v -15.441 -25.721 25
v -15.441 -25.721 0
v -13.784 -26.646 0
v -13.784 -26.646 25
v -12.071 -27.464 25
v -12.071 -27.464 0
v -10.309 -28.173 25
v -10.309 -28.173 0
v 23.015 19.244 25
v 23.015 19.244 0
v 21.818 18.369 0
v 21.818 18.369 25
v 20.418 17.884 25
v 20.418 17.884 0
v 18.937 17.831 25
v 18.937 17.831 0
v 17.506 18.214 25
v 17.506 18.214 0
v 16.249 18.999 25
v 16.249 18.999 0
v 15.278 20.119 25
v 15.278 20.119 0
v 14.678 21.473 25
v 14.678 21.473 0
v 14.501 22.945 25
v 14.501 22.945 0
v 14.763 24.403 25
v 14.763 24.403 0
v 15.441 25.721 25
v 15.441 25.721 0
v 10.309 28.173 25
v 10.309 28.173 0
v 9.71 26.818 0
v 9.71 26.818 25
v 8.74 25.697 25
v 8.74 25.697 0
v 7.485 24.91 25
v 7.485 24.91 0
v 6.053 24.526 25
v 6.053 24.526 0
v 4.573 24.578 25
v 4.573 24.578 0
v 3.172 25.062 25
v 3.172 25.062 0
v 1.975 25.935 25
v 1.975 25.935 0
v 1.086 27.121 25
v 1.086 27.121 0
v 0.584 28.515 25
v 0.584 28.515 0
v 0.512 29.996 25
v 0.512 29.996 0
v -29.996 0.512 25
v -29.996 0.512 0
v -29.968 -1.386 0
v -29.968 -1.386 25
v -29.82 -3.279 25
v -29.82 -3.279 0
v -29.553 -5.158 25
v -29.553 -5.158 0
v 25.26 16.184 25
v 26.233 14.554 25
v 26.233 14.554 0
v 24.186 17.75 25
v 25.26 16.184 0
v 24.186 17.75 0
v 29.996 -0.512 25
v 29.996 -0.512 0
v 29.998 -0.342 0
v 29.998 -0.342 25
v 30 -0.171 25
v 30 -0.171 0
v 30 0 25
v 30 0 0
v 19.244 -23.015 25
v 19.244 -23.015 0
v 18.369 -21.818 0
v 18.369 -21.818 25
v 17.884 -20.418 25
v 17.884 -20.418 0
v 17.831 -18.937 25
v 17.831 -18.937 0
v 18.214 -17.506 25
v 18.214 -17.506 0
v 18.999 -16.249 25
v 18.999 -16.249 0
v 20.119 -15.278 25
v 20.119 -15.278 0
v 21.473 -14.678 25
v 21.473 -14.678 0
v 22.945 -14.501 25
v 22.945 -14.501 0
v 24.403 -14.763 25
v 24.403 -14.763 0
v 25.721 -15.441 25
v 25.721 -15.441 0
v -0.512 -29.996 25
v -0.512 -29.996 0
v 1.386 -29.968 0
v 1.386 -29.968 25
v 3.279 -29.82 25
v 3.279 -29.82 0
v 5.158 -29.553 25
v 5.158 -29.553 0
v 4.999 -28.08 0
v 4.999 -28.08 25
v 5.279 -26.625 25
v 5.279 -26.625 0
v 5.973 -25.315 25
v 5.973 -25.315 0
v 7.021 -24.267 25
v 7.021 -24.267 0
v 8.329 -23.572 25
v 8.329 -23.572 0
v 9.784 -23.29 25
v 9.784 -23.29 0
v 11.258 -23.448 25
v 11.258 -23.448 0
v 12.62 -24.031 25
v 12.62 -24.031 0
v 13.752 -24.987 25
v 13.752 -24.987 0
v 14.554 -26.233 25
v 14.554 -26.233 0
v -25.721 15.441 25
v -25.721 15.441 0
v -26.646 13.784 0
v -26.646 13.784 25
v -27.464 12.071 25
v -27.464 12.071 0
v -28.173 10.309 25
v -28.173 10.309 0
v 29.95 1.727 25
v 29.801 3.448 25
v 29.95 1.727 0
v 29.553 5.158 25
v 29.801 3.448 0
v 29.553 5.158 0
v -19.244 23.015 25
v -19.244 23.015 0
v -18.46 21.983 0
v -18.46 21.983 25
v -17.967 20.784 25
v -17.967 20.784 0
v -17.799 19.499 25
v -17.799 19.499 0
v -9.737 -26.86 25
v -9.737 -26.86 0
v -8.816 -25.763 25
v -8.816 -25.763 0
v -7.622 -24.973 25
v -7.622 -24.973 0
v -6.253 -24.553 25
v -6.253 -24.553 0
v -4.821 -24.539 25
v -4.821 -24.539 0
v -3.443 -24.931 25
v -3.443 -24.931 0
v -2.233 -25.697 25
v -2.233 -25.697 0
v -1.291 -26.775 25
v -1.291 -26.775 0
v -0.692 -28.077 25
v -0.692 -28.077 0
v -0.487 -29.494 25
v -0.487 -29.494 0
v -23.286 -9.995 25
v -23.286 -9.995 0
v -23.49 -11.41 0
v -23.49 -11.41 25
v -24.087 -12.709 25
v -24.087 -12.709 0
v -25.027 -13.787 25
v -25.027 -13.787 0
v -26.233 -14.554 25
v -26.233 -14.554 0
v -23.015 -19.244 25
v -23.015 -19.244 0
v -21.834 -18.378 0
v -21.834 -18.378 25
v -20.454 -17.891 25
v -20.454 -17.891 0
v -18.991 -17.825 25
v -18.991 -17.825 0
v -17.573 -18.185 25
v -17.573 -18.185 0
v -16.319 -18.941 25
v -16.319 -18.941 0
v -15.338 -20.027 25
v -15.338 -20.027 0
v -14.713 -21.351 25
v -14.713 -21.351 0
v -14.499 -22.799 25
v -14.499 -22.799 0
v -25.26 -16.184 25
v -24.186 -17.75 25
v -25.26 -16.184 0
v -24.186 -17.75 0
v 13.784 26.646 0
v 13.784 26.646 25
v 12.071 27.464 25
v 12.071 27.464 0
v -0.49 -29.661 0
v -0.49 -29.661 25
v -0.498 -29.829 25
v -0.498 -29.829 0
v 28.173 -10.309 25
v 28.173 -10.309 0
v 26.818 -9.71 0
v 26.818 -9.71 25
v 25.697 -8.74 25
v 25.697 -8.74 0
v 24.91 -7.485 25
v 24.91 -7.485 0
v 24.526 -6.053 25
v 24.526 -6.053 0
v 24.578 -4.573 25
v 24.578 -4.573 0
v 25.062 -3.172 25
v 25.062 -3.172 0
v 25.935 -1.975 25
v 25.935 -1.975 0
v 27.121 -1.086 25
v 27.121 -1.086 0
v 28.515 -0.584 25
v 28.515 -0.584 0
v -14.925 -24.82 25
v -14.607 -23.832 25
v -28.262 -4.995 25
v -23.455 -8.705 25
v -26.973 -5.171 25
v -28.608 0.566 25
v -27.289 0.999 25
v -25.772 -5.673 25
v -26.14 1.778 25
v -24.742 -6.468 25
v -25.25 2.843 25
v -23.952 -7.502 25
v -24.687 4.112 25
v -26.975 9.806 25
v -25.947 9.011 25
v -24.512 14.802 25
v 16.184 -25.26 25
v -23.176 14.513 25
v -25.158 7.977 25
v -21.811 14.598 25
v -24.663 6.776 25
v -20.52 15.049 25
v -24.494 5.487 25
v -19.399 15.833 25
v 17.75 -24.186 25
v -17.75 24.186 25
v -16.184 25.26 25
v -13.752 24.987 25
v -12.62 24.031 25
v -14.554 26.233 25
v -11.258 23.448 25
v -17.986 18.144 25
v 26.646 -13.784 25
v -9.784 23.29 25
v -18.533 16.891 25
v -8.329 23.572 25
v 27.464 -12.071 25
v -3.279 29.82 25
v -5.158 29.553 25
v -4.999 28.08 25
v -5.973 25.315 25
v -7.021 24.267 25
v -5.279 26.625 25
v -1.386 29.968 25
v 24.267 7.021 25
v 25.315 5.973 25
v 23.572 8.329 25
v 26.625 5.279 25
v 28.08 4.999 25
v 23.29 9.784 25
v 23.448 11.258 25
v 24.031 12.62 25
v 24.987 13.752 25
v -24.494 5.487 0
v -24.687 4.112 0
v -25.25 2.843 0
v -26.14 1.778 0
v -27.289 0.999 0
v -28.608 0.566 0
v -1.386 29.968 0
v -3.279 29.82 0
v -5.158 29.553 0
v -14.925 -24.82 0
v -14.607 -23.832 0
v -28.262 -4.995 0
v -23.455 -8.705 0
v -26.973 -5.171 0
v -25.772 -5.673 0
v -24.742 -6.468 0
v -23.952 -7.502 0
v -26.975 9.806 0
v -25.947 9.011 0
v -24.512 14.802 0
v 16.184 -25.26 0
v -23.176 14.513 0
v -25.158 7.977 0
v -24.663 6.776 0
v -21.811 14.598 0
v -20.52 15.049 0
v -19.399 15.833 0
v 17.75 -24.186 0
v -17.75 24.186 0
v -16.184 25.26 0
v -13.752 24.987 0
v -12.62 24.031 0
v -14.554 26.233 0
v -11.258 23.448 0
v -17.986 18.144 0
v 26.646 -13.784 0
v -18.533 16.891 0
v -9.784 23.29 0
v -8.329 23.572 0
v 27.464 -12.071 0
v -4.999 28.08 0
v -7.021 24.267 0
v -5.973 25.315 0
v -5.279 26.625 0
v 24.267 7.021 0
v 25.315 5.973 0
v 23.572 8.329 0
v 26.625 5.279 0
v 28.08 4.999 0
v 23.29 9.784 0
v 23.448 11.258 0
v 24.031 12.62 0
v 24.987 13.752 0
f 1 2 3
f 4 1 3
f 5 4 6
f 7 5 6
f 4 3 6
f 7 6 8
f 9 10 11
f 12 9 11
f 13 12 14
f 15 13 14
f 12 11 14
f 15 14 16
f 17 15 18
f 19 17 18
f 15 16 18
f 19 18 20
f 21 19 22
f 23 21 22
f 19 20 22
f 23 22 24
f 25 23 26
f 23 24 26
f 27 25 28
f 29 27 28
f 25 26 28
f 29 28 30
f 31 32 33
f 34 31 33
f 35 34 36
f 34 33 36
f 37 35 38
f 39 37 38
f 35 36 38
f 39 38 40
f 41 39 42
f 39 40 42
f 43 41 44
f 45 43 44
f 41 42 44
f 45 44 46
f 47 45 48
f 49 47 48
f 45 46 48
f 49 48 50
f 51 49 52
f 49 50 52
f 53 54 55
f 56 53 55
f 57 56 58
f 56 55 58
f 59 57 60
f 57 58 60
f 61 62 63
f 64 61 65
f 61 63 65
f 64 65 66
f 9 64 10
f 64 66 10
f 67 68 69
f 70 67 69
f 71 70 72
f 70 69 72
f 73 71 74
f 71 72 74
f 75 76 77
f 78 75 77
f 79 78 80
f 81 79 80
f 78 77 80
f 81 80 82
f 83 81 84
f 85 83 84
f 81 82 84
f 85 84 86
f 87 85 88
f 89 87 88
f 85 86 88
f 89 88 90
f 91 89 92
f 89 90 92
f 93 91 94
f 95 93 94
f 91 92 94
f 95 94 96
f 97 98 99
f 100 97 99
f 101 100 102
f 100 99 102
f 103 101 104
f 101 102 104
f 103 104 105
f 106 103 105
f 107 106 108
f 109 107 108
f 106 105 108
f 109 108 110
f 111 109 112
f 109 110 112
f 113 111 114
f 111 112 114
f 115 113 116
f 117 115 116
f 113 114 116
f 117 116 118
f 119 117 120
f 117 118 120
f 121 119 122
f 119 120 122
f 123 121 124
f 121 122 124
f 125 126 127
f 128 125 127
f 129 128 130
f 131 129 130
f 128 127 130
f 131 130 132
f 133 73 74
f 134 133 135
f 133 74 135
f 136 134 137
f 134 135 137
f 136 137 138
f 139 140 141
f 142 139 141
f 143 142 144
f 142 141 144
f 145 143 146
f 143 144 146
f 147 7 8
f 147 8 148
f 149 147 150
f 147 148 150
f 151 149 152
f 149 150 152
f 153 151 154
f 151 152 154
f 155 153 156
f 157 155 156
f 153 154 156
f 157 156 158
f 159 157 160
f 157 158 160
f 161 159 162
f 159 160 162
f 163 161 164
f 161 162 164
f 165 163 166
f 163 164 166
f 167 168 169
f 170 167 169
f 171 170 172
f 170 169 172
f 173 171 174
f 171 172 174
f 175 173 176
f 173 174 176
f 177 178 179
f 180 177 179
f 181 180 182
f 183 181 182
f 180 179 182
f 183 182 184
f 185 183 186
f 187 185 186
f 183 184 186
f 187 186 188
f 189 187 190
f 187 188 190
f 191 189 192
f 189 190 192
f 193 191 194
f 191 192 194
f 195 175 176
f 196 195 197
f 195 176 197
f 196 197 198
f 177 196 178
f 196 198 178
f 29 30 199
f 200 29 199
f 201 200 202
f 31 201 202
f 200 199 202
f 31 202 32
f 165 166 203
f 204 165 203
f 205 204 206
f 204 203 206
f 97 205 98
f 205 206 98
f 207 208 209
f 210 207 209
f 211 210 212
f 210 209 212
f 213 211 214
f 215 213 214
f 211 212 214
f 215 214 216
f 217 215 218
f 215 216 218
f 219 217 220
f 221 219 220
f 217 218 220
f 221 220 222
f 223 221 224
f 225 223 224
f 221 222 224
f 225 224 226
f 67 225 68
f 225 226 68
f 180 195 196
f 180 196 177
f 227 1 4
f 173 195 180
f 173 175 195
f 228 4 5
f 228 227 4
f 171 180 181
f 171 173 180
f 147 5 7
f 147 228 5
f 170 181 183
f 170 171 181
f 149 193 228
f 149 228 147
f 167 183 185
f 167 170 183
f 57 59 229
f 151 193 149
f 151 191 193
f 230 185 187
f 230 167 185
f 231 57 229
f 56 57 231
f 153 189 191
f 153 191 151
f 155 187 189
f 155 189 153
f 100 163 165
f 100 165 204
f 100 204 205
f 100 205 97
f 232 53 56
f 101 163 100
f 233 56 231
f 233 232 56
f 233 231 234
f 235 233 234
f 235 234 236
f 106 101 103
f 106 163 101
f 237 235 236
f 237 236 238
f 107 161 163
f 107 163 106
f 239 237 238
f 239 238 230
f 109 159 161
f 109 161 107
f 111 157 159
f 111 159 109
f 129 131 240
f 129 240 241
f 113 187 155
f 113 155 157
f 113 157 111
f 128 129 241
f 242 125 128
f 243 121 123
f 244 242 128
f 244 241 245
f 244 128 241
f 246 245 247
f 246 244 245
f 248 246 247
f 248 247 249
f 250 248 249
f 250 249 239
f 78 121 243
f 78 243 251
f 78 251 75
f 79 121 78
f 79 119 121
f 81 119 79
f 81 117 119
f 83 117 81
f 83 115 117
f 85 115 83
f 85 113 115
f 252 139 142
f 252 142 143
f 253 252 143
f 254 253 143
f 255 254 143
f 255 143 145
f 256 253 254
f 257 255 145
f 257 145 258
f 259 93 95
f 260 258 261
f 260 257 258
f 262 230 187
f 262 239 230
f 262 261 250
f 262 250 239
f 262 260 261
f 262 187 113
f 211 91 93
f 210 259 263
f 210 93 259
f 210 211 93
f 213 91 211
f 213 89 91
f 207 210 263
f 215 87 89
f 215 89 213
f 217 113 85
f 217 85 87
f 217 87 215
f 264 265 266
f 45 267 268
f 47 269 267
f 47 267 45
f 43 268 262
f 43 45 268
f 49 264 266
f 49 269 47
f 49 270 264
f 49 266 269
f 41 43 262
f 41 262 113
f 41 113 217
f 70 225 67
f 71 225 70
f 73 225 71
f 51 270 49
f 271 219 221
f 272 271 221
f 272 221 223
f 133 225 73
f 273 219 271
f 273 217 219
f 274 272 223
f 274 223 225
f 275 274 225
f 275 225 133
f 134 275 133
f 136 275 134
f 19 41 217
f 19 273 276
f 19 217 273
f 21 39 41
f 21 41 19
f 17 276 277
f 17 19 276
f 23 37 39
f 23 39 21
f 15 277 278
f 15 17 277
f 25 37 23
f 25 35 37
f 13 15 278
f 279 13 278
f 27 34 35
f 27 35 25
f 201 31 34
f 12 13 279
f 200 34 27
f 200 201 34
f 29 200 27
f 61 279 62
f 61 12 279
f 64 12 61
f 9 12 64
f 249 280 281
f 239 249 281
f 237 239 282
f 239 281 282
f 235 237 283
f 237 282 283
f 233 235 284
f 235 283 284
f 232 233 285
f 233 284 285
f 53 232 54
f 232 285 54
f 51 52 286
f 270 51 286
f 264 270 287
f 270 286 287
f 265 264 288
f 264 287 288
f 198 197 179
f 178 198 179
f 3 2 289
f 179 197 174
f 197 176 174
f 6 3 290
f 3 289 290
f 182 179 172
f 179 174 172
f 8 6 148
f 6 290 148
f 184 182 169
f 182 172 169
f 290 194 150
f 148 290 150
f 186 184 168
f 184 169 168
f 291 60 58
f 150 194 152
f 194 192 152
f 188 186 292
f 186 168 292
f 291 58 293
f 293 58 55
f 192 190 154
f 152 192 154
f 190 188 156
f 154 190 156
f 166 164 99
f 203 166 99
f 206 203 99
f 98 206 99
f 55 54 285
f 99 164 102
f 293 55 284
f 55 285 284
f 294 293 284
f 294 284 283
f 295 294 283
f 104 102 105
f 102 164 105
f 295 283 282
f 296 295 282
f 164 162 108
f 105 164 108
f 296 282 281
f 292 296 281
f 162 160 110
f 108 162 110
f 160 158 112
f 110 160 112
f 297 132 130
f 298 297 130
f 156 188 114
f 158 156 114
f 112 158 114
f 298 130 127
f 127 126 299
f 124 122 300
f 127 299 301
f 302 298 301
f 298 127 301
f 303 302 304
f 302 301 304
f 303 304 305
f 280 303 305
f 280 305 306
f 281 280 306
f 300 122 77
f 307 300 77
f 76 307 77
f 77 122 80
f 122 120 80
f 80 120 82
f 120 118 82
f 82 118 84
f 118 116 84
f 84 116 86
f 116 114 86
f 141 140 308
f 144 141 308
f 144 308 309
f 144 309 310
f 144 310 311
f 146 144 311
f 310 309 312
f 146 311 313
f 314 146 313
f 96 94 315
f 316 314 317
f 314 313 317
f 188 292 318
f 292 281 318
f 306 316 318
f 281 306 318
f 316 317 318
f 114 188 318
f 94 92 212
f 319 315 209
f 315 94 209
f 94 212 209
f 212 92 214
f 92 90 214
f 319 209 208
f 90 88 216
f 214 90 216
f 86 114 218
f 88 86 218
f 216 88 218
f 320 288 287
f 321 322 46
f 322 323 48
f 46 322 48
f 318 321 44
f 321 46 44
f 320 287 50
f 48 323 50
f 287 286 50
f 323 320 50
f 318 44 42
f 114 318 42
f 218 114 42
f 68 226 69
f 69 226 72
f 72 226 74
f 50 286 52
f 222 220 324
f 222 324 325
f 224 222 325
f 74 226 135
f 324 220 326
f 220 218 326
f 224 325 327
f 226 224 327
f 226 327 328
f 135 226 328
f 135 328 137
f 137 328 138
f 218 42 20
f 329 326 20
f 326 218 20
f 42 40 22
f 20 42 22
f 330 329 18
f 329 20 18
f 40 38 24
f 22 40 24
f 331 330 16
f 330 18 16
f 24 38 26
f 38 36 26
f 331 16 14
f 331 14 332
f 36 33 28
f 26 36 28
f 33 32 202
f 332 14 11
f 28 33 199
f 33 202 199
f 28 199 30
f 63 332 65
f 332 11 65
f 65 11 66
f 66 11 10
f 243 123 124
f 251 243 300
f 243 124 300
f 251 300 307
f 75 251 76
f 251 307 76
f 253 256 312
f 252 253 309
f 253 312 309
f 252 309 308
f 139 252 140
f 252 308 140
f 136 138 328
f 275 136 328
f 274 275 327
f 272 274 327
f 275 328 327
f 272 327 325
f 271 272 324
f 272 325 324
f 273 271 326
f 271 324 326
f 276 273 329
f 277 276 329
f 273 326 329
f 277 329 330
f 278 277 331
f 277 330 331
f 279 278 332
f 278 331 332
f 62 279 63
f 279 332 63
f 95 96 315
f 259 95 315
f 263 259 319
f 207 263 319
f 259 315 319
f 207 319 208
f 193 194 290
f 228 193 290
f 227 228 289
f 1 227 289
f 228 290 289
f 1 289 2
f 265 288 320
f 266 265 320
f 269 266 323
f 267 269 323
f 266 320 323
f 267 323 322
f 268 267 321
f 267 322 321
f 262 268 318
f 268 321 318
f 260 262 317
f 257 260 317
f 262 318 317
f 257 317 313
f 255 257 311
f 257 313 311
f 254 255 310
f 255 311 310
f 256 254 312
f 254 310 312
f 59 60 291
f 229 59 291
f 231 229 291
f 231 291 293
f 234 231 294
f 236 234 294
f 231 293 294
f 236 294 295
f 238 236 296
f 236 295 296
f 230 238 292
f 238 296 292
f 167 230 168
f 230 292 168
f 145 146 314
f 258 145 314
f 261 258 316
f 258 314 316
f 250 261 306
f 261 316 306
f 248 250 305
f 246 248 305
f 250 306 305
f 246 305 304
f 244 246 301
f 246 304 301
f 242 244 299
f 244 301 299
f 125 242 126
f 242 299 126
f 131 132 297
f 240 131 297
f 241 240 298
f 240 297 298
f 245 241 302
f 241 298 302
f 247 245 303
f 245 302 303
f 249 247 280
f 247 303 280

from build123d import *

# Parameters (mm, degrees)
F1_DEPTH = 25


with BuildPart() as f1:
    # F0 (on Top) → F1 (new body)
    with BuildSketch(Plane.XY):
        with BuildLine():
            ThreePointArc((29.995626, -0.512264), (29.998907, -0.256141), (30, 0))
            ThreePointArc((30, 0), (29.888092, 2.588808), (29.553205, 5.158303))
            ThreePointArc((29.553205, 5.158303), (23.571681, 8.329218), (26.233106, 14.55418))
            ThreePointArc((26.233106, 14.55418), (24.735282, 16.975448), (23.014675, 19.243824))
            ThreePointArc((23.014675, 19.243824), (16.249065, 18.999155), (15.441446, 25.720842))
            ThreePointArc((15.441446, 25.720842), (12.933658, 27.06881), (10.309381, 28.172978))
            ThreePointArc((10.309381, 28.172978), (4.572526, 24.578283), (0.512264, 29.995626))
            ThreePointArc((0.512264, 29.995626), (-2.333528, 29.909106), (-5.158303, 29.553205))
            ThreePointArc((-5.158303, 29.553205), (-8.329218, 23.571681), (-14.55418, 26.233106))
            ThreePointArc((-14.55418, 26.233106), (-16.975448, 24.735282), (-19.243824, 23.014675))
            ThreePointArc((-19.243824, 23.014675), (-18.17428, 21.39943), (-17.798986, 19.498878))
            ThreePointArc((-17.798986, 19.498878), (-20.519653, 15.048638), (-25.720842, 15.441446))
            ThreePointArc((-25.720842, 15.441446), (-27.06881, 12.933658), (-28.172978, 10.309381))
            ThreePointArc((-28.172978, 10.309381), (-25.518716, 8.519785), (-24.49394, 5.487031))
            ThreePointArc((-24.49394, 5.487031), (-26.140466, 1.778363), (-29.995626, 0.512264))
            ThreePointArc((-29.995626, 0.512264), (-29.909106, -2.333528), (-29.553205, -5.158303))
            ThreePointArc((-29.553205, -5.158303), (-25.23118, -6.036783), (-23.286017, -9.995062))
            ThreePointArc((-23.286017, -9.995062), (-24.086936, -12.709417), (-26.233106, -14.55418))
            ThreePointArc((-26.233106, -14.55418), (-24.735282, -16.975448), (-23.014675, -19.243824))
            ThreePointArc((-23.014675, -19.243824), (-17.57261, -18.184932), (-14.498878, -22.798986))
            ThreePointArc((-14.498878, -22.798986), (-14.740351, -24.334049), (-15.441446, -25.720842))
            ThreePointArc((-15.441446, -25.720842), (-12.933658, -27.06881), (-10.309381, -28.172978))
            ThreePointArc((-10.309381, -28.172978), (-4.820604, -24.538551), (-0.487031, -29.49394))
            ThreePointArc((-0.487031, -29.49394), (-0.493343, -29.7451), (-0.512264, -29.995626))
            ThreePointArc((-0.512264, -29.995626), (2.333528, -29.909106), (5.158303, -29.553205))
            ThreePointArc((5.158303, -29.553205), (8.329218, -23.571681), (14.55418, -26.233106))
            ThreePointArc((14.55418, -26.233106), (16.975448, -24.735282), (19.243824, -23.014675))
            ThreePointArc((19.243824, -23.014675), (18.999155, -16.249065), (25.720842, -15.441446))
            ThreePointArc((25.720842, -15.441446), (27.06881, -12.933658), (28.172978, -10.309381))
            ThreePointArc((28.172978, -10.309381), (24.578283, -4.572526), (29.995626, -0.512264))
        make_face()
    extrude(amount=F1_DEPTH)


solid = f1.part
